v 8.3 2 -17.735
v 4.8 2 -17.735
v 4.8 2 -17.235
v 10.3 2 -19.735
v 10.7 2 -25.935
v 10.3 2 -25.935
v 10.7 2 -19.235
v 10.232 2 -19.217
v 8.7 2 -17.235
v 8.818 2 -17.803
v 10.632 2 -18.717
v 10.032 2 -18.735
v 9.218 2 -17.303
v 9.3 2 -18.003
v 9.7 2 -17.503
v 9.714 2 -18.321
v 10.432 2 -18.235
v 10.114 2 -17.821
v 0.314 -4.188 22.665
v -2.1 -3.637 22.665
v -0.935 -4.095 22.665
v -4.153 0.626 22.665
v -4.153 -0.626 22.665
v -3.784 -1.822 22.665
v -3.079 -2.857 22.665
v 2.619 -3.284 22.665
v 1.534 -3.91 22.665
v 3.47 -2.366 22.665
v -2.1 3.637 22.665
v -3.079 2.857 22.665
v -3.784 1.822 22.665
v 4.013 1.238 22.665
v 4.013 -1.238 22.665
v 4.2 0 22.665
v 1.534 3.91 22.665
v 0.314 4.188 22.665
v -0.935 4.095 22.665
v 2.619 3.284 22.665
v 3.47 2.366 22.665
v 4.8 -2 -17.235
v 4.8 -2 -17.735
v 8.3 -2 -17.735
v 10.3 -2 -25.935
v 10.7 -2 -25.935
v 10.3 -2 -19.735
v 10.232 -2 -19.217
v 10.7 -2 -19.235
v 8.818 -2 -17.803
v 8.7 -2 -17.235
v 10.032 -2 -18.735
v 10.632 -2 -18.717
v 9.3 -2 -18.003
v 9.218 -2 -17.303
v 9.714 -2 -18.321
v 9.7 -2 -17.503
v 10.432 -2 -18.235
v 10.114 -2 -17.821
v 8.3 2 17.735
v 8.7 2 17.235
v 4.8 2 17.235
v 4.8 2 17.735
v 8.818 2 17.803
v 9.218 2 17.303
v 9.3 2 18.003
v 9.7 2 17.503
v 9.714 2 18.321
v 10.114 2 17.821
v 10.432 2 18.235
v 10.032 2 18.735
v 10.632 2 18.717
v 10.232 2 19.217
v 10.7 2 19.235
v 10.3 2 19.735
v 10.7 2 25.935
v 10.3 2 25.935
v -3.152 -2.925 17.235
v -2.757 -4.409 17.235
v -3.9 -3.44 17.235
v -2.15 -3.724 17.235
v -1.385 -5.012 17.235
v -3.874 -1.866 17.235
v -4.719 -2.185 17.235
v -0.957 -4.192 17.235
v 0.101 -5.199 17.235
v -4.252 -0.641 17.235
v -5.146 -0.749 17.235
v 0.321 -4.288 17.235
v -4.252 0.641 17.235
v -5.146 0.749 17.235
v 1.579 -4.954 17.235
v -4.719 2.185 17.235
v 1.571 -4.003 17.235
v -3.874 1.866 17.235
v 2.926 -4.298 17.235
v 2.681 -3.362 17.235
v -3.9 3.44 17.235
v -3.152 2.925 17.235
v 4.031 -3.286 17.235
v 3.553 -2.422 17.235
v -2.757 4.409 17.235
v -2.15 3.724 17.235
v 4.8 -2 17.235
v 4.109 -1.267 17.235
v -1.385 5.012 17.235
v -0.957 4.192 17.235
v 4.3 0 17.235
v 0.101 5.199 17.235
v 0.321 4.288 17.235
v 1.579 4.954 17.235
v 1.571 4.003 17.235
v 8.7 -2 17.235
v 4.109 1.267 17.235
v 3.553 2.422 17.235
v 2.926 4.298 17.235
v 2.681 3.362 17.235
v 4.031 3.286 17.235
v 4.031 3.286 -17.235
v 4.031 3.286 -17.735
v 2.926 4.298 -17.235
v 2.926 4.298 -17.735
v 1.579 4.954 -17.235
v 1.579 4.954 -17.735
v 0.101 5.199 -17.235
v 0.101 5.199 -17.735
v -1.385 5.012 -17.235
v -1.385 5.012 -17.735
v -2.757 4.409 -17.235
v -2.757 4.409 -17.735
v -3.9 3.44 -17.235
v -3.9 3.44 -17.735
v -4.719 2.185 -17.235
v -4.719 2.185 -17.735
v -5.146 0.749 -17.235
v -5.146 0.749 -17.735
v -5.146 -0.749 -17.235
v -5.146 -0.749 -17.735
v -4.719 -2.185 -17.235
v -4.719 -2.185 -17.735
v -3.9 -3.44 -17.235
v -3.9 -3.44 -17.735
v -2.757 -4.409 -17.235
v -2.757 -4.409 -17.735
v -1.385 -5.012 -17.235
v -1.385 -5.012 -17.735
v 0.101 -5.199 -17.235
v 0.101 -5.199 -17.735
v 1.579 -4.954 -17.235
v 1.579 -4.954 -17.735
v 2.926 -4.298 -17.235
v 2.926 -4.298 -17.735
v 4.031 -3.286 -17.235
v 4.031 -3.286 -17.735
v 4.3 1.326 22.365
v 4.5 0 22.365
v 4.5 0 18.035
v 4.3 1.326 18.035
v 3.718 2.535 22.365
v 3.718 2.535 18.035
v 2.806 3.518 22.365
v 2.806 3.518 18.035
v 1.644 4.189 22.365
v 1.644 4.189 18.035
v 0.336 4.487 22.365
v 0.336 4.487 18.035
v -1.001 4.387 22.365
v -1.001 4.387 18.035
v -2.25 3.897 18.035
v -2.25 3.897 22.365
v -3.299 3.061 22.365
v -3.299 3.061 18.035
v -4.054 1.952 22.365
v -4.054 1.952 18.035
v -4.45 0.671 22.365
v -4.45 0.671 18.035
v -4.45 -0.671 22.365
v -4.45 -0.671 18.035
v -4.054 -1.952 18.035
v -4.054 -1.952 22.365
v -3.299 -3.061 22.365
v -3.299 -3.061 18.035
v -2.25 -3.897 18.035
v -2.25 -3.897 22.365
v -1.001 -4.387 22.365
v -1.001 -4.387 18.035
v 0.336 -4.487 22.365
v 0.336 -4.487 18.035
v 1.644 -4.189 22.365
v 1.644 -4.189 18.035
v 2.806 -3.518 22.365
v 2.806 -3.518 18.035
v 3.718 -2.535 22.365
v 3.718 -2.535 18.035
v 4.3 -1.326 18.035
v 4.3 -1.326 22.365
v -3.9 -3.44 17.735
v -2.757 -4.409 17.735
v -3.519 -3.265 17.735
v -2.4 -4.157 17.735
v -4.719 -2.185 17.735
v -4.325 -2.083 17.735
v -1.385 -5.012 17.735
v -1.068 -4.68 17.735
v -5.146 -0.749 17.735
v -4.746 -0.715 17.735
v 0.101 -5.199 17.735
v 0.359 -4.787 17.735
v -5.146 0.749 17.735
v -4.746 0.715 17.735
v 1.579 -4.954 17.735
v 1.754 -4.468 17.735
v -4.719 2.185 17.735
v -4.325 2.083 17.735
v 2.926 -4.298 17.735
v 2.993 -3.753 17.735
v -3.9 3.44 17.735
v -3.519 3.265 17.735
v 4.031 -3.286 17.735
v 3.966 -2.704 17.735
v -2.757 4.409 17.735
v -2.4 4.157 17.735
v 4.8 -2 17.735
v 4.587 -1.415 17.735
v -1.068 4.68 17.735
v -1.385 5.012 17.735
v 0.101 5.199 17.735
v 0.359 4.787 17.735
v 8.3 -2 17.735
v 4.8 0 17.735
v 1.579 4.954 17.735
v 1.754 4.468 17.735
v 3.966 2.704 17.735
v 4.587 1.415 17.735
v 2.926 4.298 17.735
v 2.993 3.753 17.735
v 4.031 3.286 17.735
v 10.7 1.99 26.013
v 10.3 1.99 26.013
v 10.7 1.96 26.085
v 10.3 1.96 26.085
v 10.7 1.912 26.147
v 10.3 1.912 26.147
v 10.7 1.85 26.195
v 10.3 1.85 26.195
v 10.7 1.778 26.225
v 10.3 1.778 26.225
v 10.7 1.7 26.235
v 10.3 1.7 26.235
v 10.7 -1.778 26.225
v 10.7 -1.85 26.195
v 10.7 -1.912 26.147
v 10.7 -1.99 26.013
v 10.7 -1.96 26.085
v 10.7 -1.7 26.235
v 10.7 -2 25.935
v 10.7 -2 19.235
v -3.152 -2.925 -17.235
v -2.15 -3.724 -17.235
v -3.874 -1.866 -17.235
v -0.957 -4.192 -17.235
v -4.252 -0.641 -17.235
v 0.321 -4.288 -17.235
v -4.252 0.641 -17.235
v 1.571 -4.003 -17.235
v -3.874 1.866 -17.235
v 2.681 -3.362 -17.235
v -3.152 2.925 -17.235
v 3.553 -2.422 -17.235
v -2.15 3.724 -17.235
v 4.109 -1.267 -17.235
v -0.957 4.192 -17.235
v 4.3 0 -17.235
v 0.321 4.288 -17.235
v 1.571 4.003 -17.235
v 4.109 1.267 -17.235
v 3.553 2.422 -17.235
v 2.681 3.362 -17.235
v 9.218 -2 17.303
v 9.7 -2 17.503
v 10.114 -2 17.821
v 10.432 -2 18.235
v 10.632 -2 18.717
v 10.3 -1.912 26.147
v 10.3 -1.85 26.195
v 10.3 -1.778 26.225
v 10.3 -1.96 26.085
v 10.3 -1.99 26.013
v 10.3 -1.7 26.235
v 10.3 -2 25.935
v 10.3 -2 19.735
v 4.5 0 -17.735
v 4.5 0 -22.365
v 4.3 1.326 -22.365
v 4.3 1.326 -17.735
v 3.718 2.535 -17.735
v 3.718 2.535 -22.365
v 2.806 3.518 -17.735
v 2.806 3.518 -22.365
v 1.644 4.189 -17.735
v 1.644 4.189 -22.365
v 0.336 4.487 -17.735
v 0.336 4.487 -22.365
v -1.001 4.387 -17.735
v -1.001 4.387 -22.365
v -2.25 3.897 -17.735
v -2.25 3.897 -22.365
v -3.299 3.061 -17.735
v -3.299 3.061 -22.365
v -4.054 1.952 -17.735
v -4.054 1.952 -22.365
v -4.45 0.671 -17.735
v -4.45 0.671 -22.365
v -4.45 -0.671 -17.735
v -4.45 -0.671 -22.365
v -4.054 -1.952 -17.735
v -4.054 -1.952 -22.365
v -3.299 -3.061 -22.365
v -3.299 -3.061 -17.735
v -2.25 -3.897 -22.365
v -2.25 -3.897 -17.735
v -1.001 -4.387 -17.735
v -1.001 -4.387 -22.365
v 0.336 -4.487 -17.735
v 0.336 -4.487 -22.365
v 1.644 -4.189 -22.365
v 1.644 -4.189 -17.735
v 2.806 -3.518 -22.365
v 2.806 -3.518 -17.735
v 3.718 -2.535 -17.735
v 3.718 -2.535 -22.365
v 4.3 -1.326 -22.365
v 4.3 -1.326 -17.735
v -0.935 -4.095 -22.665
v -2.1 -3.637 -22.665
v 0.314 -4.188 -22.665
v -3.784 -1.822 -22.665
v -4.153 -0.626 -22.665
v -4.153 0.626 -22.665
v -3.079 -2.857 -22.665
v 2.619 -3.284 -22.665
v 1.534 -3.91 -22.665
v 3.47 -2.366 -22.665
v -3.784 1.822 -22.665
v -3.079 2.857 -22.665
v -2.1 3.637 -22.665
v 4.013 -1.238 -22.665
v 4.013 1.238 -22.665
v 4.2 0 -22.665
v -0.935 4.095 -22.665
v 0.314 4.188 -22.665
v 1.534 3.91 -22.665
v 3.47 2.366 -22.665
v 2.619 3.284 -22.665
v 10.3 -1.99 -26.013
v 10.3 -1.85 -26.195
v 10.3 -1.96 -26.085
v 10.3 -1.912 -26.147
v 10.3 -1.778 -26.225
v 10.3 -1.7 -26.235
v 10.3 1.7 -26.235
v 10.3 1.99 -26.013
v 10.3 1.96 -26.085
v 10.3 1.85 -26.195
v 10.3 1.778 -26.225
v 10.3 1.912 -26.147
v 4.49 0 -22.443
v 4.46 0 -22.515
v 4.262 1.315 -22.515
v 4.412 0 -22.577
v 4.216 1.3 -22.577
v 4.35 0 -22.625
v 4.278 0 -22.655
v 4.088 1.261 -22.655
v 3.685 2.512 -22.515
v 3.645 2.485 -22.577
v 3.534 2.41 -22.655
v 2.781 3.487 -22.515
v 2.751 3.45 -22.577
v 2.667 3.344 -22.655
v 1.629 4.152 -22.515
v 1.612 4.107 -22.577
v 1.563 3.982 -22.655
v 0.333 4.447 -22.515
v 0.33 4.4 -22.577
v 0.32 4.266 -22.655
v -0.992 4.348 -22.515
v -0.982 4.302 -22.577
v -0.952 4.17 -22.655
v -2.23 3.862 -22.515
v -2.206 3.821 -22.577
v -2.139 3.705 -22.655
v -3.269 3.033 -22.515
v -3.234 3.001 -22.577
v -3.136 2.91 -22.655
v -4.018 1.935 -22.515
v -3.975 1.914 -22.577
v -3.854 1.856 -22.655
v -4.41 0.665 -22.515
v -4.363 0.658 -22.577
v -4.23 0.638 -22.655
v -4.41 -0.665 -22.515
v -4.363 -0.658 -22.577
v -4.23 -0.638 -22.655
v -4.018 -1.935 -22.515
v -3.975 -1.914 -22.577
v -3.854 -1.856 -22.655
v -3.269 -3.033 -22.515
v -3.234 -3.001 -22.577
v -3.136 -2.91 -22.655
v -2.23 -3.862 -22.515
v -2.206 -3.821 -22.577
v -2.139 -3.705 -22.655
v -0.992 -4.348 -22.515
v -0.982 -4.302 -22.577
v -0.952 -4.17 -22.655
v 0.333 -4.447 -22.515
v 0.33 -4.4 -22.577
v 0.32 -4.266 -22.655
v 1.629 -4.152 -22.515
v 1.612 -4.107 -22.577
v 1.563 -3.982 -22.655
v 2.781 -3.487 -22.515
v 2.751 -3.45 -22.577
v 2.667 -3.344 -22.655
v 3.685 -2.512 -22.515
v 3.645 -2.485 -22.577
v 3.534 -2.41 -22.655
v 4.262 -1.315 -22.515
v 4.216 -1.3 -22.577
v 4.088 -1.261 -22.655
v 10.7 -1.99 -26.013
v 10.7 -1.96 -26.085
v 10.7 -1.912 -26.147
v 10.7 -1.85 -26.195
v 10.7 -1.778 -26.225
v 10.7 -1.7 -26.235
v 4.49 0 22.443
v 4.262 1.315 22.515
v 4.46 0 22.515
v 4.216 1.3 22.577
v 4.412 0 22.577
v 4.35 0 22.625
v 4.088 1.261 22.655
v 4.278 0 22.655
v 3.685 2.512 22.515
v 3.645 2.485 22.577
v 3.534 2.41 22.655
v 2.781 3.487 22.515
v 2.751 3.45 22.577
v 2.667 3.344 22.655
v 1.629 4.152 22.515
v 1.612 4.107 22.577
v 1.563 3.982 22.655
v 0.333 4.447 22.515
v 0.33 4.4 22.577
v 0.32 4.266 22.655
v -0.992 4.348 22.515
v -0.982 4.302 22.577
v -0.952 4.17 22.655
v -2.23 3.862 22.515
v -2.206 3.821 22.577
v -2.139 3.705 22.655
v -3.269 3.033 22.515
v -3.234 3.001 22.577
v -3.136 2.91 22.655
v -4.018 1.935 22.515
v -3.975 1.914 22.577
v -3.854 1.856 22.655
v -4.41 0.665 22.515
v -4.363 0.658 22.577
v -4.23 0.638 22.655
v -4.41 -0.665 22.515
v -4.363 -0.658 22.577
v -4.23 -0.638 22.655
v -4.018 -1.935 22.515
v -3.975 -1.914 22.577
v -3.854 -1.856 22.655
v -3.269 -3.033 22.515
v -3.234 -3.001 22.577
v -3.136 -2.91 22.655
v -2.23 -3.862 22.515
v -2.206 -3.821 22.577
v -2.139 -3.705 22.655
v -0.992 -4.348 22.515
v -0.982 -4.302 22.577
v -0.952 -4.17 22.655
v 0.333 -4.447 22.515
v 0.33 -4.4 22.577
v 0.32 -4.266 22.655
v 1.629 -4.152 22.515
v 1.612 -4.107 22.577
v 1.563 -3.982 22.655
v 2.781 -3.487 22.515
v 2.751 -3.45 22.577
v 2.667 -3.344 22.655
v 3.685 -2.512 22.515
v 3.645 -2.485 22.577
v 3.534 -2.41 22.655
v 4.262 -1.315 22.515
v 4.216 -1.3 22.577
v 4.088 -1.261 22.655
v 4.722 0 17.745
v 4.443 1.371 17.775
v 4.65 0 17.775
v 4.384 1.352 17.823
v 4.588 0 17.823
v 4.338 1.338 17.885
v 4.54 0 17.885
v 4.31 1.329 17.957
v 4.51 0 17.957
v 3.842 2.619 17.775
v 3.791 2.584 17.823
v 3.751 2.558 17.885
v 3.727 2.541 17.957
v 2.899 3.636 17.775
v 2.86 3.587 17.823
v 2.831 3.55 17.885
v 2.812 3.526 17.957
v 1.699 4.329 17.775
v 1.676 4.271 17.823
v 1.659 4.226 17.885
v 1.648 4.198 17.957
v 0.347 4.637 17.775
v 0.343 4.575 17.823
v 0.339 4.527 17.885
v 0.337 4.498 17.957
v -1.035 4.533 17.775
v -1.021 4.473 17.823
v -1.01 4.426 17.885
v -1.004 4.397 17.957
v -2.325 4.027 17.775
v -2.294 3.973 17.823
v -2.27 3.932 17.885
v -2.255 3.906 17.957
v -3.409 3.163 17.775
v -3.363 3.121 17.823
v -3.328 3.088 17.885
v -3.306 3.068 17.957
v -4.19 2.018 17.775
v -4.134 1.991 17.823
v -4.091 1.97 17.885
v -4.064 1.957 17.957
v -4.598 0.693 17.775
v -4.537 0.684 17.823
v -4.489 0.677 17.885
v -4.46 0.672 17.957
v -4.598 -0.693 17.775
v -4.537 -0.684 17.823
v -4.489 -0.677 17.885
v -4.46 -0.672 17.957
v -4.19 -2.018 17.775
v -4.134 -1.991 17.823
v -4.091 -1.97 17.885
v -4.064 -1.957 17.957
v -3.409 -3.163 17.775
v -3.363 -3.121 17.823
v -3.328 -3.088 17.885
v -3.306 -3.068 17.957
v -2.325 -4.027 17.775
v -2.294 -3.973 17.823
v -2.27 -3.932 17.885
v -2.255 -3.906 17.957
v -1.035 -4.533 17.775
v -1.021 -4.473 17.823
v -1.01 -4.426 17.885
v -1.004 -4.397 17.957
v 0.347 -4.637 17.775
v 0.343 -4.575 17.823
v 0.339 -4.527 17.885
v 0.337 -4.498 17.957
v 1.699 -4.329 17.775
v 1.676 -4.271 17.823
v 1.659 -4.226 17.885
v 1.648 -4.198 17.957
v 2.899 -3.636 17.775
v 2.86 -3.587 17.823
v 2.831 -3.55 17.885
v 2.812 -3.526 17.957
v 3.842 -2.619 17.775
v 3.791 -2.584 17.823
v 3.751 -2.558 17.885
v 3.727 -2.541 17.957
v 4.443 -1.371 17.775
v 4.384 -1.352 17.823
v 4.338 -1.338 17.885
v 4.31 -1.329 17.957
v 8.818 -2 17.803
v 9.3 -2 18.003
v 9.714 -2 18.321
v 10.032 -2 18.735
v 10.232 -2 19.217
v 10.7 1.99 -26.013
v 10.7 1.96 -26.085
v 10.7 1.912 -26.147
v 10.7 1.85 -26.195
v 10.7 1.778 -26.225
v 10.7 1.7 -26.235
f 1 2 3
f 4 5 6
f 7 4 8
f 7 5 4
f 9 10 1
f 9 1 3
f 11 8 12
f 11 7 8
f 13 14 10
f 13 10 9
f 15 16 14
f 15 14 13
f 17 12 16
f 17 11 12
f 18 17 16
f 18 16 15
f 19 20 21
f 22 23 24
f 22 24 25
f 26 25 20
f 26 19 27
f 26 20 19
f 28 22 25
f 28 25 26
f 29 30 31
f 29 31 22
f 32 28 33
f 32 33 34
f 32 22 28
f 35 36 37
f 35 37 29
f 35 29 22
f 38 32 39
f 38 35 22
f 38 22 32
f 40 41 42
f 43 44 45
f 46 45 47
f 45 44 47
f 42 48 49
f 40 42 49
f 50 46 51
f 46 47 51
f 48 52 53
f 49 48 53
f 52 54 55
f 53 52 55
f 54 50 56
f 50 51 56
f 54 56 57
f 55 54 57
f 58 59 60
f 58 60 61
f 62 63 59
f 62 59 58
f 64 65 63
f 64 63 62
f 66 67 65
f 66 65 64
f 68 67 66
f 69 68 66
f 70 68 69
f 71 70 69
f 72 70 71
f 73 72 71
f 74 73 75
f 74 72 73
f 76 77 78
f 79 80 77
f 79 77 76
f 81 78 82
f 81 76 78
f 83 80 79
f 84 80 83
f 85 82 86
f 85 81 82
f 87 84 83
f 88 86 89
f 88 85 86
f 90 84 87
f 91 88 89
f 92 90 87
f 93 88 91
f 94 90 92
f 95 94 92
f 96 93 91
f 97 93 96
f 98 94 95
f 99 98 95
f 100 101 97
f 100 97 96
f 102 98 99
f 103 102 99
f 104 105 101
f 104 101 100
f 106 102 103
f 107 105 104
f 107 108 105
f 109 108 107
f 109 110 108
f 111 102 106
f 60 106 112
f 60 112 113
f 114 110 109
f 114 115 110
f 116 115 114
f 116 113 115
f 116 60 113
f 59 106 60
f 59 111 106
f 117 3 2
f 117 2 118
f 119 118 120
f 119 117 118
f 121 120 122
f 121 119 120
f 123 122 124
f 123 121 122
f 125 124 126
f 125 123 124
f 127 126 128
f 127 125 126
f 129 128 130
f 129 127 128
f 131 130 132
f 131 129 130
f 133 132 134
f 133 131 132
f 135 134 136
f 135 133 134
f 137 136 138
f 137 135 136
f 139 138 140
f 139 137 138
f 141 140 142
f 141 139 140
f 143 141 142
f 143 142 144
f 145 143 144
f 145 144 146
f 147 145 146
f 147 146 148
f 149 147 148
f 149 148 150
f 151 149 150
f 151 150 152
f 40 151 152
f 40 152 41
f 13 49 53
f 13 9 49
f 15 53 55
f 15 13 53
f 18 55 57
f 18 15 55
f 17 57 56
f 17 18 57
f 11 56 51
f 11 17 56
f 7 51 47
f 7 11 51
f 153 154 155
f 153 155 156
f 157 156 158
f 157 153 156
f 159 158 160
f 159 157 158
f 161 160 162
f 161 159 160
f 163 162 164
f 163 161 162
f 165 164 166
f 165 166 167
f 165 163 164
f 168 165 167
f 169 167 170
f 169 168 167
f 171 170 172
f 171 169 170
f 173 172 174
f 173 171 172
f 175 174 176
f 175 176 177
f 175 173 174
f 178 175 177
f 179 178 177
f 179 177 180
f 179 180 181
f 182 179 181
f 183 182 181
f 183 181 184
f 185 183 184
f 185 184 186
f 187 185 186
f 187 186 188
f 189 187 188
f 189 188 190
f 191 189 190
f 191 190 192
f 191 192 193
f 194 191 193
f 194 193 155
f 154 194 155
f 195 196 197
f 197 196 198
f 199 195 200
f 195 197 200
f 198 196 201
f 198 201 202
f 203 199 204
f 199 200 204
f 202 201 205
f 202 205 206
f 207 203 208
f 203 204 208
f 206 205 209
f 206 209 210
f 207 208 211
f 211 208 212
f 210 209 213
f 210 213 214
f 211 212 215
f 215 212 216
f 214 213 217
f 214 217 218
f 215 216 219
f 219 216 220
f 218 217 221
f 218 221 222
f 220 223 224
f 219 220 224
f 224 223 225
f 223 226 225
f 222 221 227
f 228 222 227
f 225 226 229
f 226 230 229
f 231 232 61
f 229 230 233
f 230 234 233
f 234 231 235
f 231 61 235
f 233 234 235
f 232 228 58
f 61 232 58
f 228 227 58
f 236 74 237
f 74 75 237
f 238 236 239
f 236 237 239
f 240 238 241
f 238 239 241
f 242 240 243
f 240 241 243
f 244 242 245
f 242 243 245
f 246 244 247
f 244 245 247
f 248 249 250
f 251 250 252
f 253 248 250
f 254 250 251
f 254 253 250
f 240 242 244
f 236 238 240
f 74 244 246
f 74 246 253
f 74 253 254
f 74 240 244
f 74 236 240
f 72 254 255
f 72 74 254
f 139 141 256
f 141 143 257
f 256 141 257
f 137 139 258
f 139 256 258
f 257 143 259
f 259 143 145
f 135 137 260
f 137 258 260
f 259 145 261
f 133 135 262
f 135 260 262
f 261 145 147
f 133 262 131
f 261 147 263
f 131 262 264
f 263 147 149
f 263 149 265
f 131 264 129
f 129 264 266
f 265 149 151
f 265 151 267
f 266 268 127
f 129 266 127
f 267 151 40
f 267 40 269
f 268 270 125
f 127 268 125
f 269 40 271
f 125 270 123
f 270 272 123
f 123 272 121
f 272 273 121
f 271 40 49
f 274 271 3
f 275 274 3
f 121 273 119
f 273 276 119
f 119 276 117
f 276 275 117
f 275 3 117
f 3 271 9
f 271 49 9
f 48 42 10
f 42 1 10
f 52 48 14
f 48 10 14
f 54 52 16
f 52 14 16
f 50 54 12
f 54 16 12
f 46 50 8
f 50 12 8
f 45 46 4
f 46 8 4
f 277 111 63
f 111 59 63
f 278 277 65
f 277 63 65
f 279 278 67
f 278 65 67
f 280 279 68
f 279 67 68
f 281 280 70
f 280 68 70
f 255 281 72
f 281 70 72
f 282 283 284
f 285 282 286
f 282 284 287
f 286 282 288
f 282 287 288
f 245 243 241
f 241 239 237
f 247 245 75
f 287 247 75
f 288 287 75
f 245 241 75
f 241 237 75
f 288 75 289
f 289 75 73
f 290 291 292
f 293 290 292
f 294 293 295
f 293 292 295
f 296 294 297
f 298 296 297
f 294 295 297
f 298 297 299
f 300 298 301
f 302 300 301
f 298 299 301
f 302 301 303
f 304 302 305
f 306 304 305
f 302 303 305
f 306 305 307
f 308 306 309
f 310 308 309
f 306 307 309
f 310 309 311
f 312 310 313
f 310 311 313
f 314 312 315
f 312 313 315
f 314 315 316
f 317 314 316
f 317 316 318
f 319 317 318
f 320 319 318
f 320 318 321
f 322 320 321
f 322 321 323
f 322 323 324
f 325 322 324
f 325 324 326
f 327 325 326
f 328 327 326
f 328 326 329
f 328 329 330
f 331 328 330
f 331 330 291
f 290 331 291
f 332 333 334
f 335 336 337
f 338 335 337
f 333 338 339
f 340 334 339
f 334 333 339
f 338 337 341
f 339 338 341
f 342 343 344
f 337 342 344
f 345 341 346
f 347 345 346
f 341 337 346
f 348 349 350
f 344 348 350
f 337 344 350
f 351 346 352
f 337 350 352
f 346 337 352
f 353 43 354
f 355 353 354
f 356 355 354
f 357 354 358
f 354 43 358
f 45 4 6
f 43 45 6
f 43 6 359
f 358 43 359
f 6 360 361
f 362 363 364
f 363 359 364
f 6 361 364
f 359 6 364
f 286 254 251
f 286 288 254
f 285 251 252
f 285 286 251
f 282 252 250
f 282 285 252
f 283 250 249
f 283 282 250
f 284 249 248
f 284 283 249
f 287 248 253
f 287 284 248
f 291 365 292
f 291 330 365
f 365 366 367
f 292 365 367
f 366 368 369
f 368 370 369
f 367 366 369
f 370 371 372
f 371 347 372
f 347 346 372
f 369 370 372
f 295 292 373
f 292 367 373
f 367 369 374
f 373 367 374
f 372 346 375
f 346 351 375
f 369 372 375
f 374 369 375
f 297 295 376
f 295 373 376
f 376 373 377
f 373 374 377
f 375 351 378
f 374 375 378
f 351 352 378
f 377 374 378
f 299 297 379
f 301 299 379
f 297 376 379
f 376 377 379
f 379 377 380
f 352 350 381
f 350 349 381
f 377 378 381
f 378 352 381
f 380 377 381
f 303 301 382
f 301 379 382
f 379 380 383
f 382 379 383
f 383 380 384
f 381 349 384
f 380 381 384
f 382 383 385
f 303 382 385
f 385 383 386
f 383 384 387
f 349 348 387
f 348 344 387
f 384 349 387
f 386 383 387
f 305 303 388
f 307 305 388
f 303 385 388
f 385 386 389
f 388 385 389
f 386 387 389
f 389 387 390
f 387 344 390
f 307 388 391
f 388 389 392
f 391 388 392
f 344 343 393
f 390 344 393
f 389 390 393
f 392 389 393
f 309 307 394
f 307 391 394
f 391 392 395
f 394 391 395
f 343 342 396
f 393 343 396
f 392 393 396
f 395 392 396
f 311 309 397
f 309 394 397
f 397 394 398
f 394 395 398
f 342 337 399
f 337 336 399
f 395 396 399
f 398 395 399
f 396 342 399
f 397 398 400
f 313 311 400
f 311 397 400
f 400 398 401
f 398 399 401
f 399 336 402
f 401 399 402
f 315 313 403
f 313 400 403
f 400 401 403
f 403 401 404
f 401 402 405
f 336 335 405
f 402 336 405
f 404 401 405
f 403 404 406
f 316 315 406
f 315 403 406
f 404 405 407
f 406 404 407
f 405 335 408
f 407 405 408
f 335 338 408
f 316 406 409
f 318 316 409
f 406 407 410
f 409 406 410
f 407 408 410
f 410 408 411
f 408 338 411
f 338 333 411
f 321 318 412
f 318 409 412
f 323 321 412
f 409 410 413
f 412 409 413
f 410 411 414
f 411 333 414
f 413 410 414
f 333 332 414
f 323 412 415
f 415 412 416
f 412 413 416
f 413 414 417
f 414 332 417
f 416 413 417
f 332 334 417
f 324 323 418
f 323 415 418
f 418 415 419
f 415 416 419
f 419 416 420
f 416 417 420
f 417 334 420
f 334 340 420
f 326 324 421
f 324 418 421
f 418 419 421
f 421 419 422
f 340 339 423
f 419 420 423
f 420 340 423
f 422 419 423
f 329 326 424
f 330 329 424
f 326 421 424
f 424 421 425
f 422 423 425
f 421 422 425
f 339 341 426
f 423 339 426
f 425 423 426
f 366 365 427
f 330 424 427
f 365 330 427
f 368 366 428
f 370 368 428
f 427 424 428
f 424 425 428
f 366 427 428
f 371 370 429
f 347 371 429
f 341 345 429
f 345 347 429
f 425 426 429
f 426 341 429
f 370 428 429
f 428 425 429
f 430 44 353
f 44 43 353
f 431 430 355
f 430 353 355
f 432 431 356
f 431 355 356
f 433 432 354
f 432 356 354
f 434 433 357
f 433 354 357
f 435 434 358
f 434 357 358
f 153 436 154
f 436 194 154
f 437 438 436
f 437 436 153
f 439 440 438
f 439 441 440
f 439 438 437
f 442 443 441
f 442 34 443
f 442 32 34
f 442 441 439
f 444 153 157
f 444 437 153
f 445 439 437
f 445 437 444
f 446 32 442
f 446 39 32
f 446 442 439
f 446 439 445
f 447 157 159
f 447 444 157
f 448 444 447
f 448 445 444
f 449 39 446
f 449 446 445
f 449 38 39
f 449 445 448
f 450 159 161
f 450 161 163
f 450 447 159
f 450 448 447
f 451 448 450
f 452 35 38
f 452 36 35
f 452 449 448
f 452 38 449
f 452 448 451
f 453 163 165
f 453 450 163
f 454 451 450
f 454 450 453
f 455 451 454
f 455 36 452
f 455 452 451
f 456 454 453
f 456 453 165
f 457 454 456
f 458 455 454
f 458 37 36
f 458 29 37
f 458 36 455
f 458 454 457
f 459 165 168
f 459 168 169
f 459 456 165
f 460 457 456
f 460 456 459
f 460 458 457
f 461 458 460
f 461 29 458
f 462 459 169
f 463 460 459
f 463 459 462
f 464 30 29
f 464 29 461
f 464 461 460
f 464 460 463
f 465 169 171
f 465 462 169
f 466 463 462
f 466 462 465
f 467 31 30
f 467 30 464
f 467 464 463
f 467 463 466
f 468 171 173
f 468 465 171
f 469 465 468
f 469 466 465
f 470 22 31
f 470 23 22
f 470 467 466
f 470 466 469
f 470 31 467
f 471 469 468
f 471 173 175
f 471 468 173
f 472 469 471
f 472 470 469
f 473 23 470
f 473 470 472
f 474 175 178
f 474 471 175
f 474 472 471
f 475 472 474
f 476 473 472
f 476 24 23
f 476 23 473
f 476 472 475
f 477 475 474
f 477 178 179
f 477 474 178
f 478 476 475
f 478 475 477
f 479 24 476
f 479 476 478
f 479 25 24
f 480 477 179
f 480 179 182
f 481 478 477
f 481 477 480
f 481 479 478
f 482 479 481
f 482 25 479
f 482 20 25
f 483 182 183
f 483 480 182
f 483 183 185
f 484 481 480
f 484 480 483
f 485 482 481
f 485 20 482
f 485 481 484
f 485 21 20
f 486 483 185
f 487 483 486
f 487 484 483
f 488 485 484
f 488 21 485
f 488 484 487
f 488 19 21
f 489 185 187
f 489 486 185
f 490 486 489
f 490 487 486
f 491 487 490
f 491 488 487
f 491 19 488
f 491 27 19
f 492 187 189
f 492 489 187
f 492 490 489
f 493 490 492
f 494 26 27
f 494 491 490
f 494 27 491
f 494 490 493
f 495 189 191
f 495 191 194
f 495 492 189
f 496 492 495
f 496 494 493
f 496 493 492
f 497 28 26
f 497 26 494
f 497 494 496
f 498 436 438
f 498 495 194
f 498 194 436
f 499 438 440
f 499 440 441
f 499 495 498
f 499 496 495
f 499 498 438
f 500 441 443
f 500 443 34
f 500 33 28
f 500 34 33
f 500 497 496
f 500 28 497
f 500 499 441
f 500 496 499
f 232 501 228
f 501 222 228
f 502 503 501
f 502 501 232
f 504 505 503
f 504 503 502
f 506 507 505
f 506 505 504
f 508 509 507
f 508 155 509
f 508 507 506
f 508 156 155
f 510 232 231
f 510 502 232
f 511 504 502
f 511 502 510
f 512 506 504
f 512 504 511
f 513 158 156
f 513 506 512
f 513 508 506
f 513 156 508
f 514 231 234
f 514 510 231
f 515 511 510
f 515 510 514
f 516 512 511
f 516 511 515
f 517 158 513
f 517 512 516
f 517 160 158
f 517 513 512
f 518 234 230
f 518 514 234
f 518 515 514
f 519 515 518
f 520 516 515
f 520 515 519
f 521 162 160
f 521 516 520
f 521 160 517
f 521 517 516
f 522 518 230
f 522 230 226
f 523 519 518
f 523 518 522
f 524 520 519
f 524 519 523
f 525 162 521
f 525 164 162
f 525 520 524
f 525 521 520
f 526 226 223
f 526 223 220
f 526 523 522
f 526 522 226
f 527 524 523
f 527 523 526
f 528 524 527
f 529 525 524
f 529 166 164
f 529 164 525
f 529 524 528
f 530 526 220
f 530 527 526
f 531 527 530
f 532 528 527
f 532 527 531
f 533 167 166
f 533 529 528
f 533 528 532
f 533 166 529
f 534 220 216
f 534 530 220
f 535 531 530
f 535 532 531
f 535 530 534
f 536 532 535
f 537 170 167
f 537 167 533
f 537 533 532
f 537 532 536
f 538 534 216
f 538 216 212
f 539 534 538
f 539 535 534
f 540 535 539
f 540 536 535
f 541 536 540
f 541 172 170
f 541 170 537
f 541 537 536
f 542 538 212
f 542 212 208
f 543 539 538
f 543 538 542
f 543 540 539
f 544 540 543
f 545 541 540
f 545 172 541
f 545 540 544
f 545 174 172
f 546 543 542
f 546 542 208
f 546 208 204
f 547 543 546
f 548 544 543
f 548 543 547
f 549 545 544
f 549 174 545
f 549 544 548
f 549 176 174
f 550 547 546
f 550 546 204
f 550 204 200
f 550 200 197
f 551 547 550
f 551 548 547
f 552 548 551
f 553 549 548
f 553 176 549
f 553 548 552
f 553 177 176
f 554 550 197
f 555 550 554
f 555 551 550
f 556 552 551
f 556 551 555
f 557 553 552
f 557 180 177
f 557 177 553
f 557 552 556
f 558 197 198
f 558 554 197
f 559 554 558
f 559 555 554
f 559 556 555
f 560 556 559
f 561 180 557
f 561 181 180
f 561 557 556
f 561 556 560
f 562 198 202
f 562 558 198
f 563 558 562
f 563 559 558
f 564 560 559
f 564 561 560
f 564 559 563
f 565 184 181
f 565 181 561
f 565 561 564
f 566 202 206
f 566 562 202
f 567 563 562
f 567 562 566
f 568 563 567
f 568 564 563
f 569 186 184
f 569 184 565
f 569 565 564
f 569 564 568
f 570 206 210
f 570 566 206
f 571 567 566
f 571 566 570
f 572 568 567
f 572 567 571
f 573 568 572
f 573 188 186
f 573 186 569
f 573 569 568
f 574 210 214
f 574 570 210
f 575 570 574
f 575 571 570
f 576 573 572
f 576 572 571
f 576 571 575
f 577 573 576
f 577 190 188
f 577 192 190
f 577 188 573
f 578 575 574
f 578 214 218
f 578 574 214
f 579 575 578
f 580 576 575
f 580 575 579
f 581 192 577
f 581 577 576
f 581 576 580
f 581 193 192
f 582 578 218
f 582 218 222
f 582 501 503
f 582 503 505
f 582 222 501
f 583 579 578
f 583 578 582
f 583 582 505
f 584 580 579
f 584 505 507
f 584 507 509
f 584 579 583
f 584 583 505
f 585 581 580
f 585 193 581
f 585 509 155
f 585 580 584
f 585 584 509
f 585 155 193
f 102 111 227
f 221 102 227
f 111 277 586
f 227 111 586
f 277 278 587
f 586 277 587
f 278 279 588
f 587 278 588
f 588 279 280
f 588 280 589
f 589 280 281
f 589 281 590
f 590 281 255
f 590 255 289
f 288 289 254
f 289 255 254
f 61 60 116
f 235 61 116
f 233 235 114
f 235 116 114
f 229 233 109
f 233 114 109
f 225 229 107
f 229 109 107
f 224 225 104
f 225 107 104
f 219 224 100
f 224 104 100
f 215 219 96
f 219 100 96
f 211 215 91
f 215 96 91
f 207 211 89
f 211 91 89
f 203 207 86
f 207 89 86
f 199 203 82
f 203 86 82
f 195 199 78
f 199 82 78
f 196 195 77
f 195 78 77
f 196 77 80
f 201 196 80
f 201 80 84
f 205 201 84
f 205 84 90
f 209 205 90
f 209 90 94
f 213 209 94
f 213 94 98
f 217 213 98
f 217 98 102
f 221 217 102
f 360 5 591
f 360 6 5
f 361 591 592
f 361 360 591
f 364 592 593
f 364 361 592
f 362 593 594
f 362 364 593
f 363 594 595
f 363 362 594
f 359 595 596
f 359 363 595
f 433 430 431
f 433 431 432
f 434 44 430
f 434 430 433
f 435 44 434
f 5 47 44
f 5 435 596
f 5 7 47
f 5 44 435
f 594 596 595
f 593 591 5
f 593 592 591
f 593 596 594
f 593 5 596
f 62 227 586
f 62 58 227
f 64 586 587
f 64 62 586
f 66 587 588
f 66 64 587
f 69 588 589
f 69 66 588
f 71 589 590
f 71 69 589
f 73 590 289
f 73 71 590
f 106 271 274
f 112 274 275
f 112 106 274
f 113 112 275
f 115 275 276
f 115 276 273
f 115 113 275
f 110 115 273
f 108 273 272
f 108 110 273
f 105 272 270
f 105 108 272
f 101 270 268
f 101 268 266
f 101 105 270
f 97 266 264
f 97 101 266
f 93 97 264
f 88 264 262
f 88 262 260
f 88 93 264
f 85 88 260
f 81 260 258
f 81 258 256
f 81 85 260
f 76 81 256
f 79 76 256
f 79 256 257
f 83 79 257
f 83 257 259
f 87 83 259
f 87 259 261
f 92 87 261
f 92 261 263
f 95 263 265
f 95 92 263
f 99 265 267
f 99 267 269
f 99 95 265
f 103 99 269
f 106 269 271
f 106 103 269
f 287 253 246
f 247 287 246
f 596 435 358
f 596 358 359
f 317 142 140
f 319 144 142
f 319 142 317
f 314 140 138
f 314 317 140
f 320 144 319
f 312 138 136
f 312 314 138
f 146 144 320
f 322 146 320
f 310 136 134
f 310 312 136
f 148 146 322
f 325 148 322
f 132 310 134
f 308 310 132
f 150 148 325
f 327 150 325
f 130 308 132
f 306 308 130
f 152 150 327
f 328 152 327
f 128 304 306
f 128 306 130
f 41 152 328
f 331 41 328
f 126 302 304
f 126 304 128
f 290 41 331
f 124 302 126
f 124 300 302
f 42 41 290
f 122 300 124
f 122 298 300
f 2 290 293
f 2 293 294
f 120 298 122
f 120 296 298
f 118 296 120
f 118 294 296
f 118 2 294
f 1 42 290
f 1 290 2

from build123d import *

# Parameters (mm, degrees)
SKETCH1_R           = 4.3
BOSS_EXTRUDE1_DEPTH = 22.665
SKETCH2_R           = 4.5
SKETCH2_R_2         = 4.3
BOSS_EXTRUDE2_DEPTH = 5.43
SKETCH3_R           = 5.2
SKETCH3_R_2         = 4.5
BOSS_EXTRUDE3_DEPTH = 0.5
SKETCH5_W           = 9
SKETCH5_H           = 4
BOSS_EXTRUDE4_DEPTH = 0.4
SKETCH6_W           = 0.5
SKETCH6_H           = 4
BOSS_EXTRUDE5_DEPTH = 5.5
SKETCH7_W           = 9
SKETCH7_H           = 4
BOSS_EXTRUDE6_DEPTH = 0.4
SKETCH8_W           = 0.5
SKETCH8_H           = 4
BOSS_EXTRUDE7_DEPTH = 5.5
FILLET2_R           = 2
FILLET3_R           = 0.3


with BuildPart() as part:
    # Sketch1 → Boss-Extrude1 (new body, symmetric)
    with BuildSketch(Plane.XY):
        Circle(SKETCH1_R)
    extrude(amount=BOSS_EXTRUDE1_DEPTH, both=True)

    # Sketch2 → Boss-Extrude2 (add)
    with BuildSketch(Plane.XY.offset(22.665)):
        Circle(SKETCH2_R)
        Circle(SKETCH2_R_2, mode=Mode.SUBTRACT)
    boss_extrude2 = extrude(amount=-BOSS_EXTRUDE2_DEPTH)

    # Sketch3 → Boss-Extrude3 (add)
    with BuildSketch(Plane.XY.offset(17.235)):
        Circle(SKETCH3_R)
        Circle(SKETCH3_R_2, mode=Mode.SUBTRACT)
    boss_extrude3 = extrude(amount=BOSS_EXTRUDE3_DEPTH)

    # Mirror1: Boss-Extrude2, Boss-Extrude3 across plane
    add(boss_extrude2.mirror(Plane.XY))
    add(boss_extrude3.mirror(Plane.XY))



with BuildPart() as body_2:
    # Sketch5 → Boss-Extrude4 (new body)
    with BuildSketch(Plane(origin=(10.7, 0, 0), x_dir=(0, 0, -1), z_dir=(1, 0, 0))):
        with Locations((21.735, 0)):
            Rectangle(SKETCH5_W, SKETCH5_H)
    extrude(amount=-BOSS_EXTRUDE4_DEPTH)


with BuildPart() as part_1:
    add(part.part)

    add(body_2.part)  # Boss-Extrude5 merges body 2
    # Sketch6 → Boss-Extrude5 (add)
    with BuildSketch(Plane.ZY.offset(-10.3)):
        with Locations((-17.485, 0)):
            Rectangle(SKETCH6_W, SKETCH6_H)
    extrude(amount=BOSS_EXTRUDE5_DEPTH)



with BuildPart() as body_2_2:
    # Sketch7 → Boss-Extrude6 (new body)
    with BuildSketch(Plane(origin=(10.7, 0, 0), x_dir=(0, 0, -1), z_dir=(1, 0, 0))):
        with Locations((-21.735, 0)):
            Rectangle(SKETCH7_W, SKETCH7_H)
    extrude(amount=-BOSS_EXTRUDE6_DEPTH)


with BuildPart() as part_2:
    add(part_1.part)

    add(body_2_2.part)  # Boss-Extrude7 merges body 2 2
    # Sketch8 → Boss-Extrude7 (add)
    with BuildSketch(Plane.ZY.offset(-10.3)):
        with Locations((17.485, 0)):
            Rectangle(SKETCH8_W, SKETCH8_H)
    extrude(amount=BOSS_EXTRUDE7_DEPTH)

    # Fillet2
    fillet2_edges = [part_2.edges().sort_by_distance(p)[0] for p in [
        (10.3, 0, -17.735),
        (10.7, 0, -17.235),
        (10.3, 0, 17.735),
        (10.7, 0, 17.235),
    ]]
    fillet(fillet2_edges, radius=FILLET2_R)

    # Fillet3
    fillet3_edges = [part_2.edges().sort_by_distance(p)[0] for p in [
        (-4.5, 0, 17.735),
        (-4.5, 0, -22.665),
        (10.5, 2, -26.235),
        (10.5, -2, -26.235),
        (10.5, -2, 26.235),
        (10.5, 2, 26.235),
        (-4.5, 0, 22.665),
    ]]
    fillet(fillet3_edges, radius=FILLET3_R)


solid = part_2.part
